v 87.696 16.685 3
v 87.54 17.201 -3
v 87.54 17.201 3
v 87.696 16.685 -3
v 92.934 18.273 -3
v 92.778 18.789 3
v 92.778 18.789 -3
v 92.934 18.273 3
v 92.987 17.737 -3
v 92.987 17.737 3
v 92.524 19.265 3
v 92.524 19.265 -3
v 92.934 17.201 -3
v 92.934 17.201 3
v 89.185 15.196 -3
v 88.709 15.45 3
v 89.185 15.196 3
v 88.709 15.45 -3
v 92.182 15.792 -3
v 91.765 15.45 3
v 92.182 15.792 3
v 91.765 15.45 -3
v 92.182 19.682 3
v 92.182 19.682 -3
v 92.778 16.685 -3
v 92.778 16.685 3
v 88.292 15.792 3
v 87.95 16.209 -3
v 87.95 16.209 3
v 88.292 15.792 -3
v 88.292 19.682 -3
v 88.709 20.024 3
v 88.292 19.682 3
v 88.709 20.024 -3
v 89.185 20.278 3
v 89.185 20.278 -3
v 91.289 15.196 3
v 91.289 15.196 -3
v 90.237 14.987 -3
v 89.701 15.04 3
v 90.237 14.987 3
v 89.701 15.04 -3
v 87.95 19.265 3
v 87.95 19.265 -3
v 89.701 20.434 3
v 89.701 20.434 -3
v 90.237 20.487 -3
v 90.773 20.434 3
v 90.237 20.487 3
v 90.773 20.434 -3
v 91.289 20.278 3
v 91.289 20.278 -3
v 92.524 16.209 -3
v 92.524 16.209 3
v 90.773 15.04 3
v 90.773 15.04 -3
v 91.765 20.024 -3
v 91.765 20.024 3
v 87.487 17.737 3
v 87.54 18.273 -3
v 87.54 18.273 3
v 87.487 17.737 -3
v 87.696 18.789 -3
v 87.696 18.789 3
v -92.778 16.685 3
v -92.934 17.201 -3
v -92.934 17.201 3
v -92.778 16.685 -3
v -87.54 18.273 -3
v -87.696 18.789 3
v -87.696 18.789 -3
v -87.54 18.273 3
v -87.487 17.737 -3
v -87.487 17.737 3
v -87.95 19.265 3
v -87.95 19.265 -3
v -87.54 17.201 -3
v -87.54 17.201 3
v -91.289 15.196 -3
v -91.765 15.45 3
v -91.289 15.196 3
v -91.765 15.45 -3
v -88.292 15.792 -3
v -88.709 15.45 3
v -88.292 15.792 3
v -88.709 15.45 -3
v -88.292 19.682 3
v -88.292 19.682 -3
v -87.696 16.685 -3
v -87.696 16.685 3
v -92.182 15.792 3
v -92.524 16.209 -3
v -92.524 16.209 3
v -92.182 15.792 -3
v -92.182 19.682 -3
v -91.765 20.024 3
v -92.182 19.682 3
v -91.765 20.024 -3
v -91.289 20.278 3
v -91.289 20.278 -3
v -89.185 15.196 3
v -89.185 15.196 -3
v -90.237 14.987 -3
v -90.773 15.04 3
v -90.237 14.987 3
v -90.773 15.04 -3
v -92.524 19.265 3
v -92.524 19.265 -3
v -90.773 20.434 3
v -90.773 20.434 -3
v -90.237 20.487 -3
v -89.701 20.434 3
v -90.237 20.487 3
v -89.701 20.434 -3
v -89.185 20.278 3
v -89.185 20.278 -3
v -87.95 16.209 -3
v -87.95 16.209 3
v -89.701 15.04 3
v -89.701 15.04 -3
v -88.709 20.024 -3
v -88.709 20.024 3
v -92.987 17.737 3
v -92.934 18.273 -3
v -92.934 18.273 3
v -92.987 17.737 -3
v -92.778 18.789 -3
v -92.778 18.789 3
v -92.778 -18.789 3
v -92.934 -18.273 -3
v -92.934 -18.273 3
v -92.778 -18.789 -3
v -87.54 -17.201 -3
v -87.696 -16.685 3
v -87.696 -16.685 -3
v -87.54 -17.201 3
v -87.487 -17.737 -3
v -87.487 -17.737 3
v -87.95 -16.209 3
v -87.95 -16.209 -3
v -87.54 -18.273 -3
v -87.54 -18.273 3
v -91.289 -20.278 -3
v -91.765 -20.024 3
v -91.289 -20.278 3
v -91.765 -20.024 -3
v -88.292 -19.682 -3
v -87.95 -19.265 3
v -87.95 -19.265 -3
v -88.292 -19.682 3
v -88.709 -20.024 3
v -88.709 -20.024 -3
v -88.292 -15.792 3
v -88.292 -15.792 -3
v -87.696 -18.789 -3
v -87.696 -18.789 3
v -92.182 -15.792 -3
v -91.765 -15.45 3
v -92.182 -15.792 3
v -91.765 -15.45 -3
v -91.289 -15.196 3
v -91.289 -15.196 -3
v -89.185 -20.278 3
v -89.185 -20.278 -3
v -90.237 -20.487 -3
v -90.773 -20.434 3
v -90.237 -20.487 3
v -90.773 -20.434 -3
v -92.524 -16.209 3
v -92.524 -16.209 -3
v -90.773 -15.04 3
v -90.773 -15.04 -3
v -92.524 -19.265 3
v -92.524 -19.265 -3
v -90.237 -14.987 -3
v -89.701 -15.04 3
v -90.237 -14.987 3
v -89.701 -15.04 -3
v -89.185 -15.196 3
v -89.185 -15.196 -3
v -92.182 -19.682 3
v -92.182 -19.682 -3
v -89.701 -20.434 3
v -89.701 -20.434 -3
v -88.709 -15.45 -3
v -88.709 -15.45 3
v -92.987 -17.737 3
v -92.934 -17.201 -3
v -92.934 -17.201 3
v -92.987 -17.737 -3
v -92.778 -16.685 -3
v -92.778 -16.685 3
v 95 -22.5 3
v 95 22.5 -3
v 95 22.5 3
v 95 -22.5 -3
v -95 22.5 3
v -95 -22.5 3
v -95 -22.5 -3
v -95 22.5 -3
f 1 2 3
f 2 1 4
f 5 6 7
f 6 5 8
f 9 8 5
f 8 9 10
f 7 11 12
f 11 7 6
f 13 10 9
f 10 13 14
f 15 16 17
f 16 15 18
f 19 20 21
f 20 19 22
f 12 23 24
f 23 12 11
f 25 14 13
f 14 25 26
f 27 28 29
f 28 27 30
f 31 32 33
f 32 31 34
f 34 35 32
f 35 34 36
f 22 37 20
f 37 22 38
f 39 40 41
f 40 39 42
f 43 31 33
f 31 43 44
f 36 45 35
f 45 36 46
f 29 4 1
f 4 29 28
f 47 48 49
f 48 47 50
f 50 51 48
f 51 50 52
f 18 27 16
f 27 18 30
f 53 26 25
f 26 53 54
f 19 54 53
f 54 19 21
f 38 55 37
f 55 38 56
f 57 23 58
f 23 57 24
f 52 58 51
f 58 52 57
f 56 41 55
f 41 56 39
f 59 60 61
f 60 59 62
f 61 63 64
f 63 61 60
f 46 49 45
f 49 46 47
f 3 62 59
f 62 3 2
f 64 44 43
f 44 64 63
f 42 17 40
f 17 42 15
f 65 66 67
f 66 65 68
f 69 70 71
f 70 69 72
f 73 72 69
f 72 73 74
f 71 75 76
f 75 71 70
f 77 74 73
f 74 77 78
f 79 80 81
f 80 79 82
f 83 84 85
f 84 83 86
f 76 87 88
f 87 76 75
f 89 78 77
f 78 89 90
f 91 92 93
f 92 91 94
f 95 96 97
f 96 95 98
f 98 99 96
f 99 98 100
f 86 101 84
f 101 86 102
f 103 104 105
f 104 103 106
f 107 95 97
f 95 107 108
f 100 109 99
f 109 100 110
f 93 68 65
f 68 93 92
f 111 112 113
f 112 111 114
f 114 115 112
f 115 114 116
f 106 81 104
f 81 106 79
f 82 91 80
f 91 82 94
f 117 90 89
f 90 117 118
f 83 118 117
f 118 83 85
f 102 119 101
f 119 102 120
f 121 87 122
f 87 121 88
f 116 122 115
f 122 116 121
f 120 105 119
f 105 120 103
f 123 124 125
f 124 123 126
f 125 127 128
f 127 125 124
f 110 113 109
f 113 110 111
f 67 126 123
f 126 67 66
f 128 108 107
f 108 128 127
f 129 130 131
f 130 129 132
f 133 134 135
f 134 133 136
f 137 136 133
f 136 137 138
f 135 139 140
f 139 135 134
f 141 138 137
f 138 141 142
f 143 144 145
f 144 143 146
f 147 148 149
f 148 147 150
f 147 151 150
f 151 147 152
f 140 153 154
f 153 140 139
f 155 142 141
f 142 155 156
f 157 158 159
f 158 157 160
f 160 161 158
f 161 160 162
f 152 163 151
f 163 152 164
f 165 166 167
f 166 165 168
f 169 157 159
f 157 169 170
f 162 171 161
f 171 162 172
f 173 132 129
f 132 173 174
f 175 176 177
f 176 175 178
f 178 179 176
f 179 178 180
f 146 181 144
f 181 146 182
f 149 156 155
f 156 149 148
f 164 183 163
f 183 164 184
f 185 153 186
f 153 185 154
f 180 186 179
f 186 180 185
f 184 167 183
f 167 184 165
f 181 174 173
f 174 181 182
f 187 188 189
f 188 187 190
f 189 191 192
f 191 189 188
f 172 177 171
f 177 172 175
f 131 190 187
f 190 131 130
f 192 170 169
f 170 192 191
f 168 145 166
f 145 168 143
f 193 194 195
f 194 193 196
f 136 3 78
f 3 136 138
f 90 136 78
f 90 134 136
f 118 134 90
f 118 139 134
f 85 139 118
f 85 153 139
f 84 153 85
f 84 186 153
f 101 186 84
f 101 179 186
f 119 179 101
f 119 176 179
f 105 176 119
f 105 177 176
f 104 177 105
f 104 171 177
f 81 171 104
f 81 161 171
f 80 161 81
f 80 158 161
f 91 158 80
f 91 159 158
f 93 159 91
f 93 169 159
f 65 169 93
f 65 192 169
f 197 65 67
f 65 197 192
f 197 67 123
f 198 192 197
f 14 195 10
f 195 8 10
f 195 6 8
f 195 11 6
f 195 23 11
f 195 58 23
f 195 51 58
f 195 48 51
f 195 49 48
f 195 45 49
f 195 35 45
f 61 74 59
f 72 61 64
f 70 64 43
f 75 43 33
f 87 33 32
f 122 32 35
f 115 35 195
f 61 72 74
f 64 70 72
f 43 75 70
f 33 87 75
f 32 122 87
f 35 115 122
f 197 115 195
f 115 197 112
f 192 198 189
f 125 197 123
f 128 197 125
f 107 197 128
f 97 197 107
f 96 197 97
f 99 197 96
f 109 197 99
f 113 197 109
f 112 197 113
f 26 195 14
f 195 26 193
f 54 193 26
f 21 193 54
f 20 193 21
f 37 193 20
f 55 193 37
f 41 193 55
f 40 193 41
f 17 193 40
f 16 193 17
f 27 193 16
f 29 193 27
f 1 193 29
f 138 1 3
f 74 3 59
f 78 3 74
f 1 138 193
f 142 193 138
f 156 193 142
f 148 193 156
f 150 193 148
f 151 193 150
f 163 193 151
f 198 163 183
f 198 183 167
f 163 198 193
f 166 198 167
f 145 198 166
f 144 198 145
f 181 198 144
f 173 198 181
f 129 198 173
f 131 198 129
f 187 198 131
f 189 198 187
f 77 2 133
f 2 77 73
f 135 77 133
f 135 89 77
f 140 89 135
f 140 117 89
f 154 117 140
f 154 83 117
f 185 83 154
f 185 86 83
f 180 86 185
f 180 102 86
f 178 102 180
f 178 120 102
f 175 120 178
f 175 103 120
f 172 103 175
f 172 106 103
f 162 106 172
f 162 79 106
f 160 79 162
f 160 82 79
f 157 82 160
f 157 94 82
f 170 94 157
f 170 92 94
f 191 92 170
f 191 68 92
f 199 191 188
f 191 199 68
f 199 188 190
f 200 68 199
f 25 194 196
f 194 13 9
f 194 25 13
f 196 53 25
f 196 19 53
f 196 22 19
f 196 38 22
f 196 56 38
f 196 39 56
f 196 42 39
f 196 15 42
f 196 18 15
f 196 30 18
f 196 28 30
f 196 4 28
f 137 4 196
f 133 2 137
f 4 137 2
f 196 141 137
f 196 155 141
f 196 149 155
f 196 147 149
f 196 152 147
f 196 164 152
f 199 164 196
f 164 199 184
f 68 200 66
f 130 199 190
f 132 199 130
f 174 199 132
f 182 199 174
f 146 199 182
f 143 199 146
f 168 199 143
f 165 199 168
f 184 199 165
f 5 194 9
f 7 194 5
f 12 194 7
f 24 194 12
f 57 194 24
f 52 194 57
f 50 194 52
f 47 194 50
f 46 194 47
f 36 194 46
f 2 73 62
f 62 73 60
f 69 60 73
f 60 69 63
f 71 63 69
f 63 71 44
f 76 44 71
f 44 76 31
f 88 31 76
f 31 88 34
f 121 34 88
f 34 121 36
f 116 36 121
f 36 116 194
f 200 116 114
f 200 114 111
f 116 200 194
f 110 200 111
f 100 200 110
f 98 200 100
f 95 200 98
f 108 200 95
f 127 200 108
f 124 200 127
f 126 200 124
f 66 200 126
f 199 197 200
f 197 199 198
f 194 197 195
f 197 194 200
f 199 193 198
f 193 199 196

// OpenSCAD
$fn = 32;

// ----------------------------------------------------------------------
// Corner plate 190 x 45 x 6
// 3 holes, centres taken from the edge offset
// ----------------------------------------------------------------------

// --- parameters (mm) ---
plate = [190, 45, 6];  // overall size (x, y, z)
holes = 3;             // number of holes the drawing asks for
hole_d = 5.5;          // hole diameter
edge = 4.763;          // hole centre offset from the plate edge

// --- derived feature positions (mm) ---
corner_x = plate[0] / 2 - edge;  // = 90.24   corner hole X
corner_y = plate[1] / 2 - edge;  // = 17.74   corner hole Y
feature_centers = [
  [corner_x, corner_y],
  [-corner_x, corner_y],
  [-corner_x, -corner_y]
];   // hole centres the loop below drills

// plate outline, every hole drilled through with the same cutters
difference() {
  cube(plate, center = true);
  for (centre = feature_centers)
    translate([centre[0], centre[1], 0])
      cylinder(d = hole_d, h = plate[2] + 2, center = true);
}
